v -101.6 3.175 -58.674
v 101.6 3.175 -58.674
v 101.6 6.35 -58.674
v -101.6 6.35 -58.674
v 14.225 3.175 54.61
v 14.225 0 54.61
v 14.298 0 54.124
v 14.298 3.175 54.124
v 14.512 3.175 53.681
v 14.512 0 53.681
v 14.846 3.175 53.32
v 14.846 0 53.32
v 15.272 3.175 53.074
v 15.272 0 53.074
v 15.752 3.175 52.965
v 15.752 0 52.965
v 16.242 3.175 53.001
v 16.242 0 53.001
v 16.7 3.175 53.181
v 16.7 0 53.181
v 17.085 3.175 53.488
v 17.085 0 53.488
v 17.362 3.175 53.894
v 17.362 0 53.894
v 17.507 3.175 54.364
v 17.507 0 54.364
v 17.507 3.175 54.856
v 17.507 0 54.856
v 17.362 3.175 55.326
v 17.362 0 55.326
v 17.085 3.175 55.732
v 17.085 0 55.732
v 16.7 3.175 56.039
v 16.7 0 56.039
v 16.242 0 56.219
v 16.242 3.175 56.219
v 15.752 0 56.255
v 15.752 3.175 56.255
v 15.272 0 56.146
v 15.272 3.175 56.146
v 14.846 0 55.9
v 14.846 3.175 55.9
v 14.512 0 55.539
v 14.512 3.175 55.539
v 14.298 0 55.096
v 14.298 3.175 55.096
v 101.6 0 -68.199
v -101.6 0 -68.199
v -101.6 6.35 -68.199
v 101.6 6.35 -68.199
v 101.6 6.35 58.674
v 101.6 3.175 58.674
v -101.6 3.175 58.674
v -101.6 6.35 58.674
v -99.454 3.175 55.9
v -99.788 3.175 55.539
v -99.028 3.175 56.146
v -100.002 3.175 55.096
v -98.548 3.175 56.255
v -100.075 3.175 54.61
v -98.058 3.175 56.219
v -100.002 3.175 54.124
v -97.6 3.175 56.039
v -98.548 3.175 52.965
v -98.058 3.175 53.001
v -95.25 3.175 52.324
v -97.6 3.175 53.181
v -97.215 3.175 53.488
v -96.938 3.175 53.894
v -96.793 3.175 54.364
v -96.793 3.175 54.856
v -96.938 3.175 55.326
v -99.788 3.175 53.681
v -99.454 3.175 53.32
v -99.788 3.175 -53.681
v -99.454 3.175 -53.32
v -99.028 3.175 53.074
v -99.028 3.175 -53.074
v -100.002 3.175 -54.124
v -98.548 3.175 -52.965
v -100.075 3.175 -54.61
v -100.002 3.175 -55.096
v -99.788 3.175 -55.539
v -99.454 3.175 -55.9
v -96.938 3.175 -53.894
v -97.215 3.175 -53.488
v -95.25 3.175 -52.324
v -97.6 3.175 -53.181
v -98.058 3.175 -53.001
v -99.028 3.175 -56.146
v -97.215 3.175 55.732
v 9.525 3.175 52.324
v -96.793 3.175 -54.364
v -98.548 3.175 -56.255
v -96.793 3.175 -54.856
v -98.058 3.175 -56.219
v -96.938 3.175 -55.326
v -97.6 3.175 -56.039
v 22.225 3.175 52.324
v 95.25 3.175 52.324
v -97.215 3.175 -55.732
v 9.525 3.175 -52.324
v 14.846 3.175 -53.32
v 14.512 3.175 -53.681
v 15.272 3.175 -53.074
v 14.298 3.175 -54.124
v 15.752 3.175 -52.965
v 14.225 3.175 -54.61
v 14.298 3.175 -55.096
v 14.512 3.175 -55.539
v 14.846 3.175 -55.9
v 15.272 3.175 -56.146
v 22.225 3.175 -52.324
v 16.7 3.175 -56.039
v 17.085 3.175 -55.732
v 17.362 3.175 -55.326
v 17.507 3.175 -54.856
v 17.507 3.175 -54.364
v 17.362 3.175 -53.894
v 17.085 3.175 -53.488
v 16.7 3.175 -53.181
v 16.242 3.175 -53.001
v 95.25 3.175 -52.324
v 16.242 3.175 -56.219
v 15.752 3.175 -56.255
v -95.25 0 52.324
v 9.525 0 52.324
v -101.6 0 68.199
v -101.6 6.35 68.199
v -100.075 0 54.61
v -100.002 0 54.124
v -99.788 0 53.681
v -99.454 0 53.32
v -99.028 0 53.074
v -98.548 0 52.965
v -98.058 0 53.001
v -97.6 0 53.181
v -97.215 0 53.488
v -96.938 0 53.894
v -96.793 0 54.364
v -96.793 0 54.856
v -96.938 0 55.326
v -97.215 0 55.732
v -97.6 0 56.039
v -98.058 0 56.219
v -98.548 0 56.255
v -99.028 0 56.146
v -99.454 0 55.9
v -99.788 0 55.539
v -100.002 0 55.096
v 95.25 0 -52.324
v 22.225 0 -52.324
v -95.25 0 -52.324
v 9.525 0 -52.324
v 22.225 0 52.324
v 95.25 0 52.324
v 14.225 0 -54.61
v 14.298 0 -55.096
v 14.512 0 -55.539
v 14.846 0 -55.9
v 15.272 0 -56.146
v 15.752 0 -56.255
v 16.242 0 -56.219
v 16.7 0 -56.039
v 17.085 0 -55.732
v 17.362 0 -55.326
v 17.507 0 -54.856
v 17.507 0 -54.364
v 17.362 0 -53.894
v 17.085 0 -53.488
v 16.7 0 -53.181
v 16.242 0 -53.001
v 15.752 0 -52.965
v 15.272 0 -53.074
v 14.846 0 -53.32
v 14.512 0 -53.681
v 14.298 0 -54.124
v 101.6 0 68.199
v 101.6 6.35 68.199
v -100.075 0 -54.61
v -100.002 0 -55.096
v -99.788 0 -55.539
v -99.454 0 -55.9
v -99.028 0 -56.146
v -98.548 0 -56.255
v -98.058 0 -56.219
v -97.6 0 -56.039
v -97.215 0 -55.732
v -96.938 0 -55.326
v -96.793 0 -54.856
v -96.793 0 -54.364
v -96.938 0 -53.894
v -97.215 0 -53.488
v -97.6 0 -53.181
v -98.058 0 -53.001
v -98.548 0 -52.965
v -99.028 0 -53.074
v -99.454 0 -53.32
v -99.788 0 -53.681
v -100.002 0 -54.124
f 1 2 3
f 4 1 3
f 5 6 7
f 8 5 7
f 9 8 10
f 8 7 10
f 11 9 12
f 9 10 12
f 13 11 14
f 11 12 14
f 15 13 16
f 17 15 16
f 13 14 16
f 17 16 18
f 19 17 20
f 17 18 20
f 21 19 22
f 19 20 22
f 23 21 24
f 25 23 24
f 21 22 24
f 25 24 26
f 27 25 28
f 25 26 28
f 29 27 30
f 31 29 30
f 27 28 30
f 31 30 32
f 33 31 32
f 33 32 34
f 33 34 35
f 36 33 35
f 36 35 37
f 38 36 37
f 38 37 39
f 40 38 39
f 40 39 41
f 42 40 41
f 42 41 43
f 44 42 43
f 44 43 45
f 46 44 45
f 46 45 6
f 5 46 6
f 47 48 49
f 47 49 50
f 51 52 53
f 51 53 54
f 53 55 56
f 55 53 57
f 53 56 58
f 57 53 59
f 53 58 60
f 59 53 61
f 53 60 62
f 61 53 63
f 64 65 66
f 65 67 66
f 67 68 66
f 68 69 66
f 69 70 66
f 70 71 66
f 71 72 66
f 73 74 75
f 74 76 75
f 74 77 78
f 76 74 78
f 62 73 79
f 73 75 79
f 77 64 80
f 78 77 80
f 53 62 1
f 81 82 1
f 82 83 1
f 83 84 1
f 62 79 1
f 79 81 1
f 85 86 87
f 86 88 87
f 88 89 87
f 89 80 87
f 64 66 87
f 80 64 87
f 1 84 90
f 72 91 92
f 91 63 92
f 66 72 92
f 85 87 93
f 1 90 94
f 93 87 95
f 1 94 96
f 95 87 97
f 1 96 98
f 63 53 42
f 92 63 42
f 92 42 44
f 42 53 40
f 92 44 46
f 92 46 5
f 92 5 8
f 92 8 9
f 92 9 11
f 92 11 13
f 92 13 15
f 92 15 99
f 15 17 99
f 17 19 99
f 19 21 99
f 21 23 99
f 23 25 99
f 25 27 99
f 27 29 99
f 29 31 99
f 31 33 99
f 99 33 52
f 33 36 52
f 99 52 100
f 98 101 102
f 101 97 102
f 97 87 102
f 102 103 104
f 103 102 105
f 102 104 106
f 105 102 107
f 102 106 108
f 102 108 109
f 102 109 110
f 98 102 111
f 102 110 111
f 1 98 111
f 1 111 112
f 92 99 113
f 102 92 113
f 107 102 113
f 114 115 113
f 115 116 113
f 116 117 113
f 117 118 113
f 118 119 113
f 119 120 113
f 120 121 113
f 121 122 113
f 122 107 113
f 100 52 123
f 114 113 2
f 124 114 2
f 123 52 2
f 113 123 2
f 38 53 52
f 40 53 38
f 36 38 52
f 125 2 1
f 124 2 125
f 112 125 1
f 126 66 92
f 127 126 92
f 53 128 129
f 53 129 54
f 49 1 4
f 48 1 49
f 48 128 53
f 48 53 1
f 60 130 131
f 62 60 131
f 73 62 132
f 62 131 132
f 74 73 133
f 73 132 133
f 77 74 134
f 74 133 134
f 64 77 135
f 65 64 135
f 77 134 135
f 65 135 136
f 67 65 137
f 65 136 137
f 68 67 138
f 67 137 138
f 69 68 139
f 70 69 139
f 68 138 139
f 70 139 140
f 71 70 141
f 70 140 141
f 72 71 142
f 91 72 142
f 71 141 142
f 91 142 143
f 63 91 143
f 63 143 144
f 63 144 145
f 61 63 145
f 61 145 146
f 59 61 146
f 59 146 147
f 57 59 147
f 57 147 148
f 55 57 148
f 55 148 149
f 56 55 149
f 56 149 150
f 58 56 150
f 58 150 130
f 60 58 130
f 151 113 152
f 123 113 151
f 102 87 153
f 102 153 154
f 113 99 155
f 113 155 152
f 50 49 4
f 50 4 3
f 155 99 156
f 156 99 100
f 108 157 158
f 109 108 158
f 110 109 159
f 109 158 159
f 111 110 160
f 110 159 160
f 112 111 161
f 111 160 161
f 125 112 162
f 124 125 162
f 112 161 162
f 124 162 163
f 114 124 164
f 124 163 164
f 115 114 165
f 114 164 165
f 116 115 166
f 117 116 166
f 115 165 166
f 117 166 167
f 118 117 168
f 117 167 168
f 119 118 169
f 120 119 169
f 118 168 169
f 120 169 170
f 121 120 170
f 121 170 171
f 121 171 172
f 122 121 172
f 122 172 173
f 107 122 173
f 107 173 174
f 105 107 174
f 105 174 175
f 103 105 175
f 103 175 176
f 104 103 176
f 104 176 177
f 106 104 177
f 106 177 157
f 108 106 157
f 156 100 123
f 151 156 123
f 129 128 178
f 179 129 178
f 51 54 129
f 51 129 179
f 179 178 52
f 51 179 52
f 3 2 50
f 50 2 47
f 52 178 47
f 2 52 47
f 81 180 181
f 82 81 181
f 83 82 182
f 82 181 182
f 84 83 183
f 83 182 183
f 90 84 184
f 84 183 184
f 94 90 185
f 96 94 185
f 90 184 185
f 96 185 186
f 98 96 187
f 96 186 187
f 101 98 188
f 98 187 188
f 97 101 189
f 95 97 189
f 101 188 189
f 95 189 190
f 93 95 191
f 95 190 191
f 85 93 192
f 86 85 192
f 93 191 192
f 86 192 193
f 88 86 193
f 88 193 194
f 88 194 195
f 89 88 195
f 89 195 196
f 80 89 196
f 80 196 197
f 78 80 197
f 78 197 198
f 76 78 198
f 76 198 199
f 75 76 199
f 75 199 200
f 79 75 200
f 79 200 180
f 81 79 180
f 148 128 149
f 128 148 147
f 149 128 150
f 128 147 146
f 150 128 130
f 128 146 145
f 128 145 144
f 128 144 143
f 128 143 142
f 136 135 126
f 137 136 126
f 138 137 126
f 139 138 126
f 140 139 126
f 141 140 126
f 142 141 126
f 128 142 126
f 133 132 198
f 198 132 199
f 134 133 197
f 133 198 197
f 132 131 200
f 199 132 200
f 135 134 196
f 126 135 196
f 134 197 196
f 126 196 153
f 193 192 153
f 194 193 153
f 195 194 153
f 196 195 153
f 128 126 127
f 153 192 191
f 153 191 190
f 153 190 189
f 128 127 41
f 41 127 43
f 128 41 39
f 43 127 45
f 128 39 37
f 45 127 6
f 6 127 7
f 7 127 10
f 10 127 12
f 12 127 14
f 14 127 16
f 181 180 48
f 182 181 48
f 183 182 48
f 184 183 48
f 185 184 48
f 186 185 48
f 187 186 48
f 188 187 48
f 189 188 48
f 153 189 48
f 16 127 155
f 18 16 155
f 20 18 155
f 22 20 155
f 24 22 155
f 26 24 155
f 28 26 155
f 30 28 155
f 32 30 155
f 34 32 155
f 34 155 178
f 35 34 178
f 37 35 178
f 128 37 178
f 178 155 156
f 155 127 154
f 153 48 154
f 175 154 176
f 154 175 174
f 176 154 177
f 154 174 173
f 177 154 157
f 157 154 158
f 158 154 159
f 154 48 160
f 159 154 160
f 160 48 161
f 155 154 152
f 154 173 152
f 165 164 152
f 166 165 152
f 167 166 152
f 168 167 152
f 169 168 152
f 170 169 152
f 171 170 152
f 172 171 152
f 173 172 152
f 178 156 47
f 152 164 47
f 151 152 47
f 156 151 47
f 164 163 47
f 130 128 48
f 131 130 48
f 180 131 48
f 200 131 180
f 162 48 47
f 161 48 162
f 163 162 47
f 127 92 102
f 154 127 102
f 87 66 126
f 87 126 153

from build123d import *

# Parameters (mm, degrees)
SKETCH1_W                 = 203.2
SKETCH1_H                 = 136.398
BOSS_EXTRUDE1_DEPTH       = 6.35
SKETCH3_W                 = 117.348
SKETCH3_H                 = 3.175
CUT_EXTRUDE1_DEPTH        = 204.2
SKETCH4_W                 = 104.775
SKETCH4_H                 = 104.648
SKETCH4_W_2               = 73.025
CUT_EXTRUDE3_DEPTH        = 4.175
M4X0_7_TAPPED_HOLE1_D     = 3.3
M4X0_7_TAPPED_HOLE1_DEPTH = 9.906


with BuildPart() as part:
    # Sketch1 → Boss-Extrude1 (new body)
    with BuildSketch(Plane(origin=(0, 0, 0), x_dir=(1, 0, 0), z_dir=(0, 1, 0))):
        Rectangle(SKETCH1_W, SKETCH1_H)
    extrude(amount=BOSS_EXTRUDE1_DEPTH)

    # Sketch3 → Cut-Extrude1 (cut, through all)
    with BuildSketch(Plane(origin=(101.6, 0, 0), x_dir=(0, 0, -1), z_dir=(1, 0, 0))):
        with Locations((0, 4.7625)):
            Rectangle(SKETCH3_W, SKETCH3_H)
    extrude(amount=-CUT_EXTRUDE1_DEPTH, mode=Mode.SUBTRACT)

    # Sketch4 → Cut-Extrude3 (cut, through all)
    with BuildSketch(Plane(origin=(0, 3.175, 0), x_dir=(1, 0, 0), z_dir=(0, 1, 0))):
        with Locations((-42.8625, 0)):
            Rectangle(SKETCH4_W, SKETCH4_H)
        with Locations((58.7375, 0)):
            Rectangle(SKETCH4_W_2, SKETCH4_H)
    extrude(amount=-CUT_EXTRUDE3_DEPTH, mode=Mode.SUBTRACT)

    # M4x0.7 Tapped Hole1
    with Locations(Plane(origin=(0, 3.175, 0), x_dir=(1, 0, 0), z_dir=(0, 1, 0))):
        with Locations((-98.425, -54.61), (-98.425, 54.61), (15.875, 54.61), (15.875, -54.61)):
            Hole(M4X0_7_TAPPED_HOLE1_D / 2, depth=M4X0_7_TAPPED_HOLE1_DEPTH)


solid = part.part
